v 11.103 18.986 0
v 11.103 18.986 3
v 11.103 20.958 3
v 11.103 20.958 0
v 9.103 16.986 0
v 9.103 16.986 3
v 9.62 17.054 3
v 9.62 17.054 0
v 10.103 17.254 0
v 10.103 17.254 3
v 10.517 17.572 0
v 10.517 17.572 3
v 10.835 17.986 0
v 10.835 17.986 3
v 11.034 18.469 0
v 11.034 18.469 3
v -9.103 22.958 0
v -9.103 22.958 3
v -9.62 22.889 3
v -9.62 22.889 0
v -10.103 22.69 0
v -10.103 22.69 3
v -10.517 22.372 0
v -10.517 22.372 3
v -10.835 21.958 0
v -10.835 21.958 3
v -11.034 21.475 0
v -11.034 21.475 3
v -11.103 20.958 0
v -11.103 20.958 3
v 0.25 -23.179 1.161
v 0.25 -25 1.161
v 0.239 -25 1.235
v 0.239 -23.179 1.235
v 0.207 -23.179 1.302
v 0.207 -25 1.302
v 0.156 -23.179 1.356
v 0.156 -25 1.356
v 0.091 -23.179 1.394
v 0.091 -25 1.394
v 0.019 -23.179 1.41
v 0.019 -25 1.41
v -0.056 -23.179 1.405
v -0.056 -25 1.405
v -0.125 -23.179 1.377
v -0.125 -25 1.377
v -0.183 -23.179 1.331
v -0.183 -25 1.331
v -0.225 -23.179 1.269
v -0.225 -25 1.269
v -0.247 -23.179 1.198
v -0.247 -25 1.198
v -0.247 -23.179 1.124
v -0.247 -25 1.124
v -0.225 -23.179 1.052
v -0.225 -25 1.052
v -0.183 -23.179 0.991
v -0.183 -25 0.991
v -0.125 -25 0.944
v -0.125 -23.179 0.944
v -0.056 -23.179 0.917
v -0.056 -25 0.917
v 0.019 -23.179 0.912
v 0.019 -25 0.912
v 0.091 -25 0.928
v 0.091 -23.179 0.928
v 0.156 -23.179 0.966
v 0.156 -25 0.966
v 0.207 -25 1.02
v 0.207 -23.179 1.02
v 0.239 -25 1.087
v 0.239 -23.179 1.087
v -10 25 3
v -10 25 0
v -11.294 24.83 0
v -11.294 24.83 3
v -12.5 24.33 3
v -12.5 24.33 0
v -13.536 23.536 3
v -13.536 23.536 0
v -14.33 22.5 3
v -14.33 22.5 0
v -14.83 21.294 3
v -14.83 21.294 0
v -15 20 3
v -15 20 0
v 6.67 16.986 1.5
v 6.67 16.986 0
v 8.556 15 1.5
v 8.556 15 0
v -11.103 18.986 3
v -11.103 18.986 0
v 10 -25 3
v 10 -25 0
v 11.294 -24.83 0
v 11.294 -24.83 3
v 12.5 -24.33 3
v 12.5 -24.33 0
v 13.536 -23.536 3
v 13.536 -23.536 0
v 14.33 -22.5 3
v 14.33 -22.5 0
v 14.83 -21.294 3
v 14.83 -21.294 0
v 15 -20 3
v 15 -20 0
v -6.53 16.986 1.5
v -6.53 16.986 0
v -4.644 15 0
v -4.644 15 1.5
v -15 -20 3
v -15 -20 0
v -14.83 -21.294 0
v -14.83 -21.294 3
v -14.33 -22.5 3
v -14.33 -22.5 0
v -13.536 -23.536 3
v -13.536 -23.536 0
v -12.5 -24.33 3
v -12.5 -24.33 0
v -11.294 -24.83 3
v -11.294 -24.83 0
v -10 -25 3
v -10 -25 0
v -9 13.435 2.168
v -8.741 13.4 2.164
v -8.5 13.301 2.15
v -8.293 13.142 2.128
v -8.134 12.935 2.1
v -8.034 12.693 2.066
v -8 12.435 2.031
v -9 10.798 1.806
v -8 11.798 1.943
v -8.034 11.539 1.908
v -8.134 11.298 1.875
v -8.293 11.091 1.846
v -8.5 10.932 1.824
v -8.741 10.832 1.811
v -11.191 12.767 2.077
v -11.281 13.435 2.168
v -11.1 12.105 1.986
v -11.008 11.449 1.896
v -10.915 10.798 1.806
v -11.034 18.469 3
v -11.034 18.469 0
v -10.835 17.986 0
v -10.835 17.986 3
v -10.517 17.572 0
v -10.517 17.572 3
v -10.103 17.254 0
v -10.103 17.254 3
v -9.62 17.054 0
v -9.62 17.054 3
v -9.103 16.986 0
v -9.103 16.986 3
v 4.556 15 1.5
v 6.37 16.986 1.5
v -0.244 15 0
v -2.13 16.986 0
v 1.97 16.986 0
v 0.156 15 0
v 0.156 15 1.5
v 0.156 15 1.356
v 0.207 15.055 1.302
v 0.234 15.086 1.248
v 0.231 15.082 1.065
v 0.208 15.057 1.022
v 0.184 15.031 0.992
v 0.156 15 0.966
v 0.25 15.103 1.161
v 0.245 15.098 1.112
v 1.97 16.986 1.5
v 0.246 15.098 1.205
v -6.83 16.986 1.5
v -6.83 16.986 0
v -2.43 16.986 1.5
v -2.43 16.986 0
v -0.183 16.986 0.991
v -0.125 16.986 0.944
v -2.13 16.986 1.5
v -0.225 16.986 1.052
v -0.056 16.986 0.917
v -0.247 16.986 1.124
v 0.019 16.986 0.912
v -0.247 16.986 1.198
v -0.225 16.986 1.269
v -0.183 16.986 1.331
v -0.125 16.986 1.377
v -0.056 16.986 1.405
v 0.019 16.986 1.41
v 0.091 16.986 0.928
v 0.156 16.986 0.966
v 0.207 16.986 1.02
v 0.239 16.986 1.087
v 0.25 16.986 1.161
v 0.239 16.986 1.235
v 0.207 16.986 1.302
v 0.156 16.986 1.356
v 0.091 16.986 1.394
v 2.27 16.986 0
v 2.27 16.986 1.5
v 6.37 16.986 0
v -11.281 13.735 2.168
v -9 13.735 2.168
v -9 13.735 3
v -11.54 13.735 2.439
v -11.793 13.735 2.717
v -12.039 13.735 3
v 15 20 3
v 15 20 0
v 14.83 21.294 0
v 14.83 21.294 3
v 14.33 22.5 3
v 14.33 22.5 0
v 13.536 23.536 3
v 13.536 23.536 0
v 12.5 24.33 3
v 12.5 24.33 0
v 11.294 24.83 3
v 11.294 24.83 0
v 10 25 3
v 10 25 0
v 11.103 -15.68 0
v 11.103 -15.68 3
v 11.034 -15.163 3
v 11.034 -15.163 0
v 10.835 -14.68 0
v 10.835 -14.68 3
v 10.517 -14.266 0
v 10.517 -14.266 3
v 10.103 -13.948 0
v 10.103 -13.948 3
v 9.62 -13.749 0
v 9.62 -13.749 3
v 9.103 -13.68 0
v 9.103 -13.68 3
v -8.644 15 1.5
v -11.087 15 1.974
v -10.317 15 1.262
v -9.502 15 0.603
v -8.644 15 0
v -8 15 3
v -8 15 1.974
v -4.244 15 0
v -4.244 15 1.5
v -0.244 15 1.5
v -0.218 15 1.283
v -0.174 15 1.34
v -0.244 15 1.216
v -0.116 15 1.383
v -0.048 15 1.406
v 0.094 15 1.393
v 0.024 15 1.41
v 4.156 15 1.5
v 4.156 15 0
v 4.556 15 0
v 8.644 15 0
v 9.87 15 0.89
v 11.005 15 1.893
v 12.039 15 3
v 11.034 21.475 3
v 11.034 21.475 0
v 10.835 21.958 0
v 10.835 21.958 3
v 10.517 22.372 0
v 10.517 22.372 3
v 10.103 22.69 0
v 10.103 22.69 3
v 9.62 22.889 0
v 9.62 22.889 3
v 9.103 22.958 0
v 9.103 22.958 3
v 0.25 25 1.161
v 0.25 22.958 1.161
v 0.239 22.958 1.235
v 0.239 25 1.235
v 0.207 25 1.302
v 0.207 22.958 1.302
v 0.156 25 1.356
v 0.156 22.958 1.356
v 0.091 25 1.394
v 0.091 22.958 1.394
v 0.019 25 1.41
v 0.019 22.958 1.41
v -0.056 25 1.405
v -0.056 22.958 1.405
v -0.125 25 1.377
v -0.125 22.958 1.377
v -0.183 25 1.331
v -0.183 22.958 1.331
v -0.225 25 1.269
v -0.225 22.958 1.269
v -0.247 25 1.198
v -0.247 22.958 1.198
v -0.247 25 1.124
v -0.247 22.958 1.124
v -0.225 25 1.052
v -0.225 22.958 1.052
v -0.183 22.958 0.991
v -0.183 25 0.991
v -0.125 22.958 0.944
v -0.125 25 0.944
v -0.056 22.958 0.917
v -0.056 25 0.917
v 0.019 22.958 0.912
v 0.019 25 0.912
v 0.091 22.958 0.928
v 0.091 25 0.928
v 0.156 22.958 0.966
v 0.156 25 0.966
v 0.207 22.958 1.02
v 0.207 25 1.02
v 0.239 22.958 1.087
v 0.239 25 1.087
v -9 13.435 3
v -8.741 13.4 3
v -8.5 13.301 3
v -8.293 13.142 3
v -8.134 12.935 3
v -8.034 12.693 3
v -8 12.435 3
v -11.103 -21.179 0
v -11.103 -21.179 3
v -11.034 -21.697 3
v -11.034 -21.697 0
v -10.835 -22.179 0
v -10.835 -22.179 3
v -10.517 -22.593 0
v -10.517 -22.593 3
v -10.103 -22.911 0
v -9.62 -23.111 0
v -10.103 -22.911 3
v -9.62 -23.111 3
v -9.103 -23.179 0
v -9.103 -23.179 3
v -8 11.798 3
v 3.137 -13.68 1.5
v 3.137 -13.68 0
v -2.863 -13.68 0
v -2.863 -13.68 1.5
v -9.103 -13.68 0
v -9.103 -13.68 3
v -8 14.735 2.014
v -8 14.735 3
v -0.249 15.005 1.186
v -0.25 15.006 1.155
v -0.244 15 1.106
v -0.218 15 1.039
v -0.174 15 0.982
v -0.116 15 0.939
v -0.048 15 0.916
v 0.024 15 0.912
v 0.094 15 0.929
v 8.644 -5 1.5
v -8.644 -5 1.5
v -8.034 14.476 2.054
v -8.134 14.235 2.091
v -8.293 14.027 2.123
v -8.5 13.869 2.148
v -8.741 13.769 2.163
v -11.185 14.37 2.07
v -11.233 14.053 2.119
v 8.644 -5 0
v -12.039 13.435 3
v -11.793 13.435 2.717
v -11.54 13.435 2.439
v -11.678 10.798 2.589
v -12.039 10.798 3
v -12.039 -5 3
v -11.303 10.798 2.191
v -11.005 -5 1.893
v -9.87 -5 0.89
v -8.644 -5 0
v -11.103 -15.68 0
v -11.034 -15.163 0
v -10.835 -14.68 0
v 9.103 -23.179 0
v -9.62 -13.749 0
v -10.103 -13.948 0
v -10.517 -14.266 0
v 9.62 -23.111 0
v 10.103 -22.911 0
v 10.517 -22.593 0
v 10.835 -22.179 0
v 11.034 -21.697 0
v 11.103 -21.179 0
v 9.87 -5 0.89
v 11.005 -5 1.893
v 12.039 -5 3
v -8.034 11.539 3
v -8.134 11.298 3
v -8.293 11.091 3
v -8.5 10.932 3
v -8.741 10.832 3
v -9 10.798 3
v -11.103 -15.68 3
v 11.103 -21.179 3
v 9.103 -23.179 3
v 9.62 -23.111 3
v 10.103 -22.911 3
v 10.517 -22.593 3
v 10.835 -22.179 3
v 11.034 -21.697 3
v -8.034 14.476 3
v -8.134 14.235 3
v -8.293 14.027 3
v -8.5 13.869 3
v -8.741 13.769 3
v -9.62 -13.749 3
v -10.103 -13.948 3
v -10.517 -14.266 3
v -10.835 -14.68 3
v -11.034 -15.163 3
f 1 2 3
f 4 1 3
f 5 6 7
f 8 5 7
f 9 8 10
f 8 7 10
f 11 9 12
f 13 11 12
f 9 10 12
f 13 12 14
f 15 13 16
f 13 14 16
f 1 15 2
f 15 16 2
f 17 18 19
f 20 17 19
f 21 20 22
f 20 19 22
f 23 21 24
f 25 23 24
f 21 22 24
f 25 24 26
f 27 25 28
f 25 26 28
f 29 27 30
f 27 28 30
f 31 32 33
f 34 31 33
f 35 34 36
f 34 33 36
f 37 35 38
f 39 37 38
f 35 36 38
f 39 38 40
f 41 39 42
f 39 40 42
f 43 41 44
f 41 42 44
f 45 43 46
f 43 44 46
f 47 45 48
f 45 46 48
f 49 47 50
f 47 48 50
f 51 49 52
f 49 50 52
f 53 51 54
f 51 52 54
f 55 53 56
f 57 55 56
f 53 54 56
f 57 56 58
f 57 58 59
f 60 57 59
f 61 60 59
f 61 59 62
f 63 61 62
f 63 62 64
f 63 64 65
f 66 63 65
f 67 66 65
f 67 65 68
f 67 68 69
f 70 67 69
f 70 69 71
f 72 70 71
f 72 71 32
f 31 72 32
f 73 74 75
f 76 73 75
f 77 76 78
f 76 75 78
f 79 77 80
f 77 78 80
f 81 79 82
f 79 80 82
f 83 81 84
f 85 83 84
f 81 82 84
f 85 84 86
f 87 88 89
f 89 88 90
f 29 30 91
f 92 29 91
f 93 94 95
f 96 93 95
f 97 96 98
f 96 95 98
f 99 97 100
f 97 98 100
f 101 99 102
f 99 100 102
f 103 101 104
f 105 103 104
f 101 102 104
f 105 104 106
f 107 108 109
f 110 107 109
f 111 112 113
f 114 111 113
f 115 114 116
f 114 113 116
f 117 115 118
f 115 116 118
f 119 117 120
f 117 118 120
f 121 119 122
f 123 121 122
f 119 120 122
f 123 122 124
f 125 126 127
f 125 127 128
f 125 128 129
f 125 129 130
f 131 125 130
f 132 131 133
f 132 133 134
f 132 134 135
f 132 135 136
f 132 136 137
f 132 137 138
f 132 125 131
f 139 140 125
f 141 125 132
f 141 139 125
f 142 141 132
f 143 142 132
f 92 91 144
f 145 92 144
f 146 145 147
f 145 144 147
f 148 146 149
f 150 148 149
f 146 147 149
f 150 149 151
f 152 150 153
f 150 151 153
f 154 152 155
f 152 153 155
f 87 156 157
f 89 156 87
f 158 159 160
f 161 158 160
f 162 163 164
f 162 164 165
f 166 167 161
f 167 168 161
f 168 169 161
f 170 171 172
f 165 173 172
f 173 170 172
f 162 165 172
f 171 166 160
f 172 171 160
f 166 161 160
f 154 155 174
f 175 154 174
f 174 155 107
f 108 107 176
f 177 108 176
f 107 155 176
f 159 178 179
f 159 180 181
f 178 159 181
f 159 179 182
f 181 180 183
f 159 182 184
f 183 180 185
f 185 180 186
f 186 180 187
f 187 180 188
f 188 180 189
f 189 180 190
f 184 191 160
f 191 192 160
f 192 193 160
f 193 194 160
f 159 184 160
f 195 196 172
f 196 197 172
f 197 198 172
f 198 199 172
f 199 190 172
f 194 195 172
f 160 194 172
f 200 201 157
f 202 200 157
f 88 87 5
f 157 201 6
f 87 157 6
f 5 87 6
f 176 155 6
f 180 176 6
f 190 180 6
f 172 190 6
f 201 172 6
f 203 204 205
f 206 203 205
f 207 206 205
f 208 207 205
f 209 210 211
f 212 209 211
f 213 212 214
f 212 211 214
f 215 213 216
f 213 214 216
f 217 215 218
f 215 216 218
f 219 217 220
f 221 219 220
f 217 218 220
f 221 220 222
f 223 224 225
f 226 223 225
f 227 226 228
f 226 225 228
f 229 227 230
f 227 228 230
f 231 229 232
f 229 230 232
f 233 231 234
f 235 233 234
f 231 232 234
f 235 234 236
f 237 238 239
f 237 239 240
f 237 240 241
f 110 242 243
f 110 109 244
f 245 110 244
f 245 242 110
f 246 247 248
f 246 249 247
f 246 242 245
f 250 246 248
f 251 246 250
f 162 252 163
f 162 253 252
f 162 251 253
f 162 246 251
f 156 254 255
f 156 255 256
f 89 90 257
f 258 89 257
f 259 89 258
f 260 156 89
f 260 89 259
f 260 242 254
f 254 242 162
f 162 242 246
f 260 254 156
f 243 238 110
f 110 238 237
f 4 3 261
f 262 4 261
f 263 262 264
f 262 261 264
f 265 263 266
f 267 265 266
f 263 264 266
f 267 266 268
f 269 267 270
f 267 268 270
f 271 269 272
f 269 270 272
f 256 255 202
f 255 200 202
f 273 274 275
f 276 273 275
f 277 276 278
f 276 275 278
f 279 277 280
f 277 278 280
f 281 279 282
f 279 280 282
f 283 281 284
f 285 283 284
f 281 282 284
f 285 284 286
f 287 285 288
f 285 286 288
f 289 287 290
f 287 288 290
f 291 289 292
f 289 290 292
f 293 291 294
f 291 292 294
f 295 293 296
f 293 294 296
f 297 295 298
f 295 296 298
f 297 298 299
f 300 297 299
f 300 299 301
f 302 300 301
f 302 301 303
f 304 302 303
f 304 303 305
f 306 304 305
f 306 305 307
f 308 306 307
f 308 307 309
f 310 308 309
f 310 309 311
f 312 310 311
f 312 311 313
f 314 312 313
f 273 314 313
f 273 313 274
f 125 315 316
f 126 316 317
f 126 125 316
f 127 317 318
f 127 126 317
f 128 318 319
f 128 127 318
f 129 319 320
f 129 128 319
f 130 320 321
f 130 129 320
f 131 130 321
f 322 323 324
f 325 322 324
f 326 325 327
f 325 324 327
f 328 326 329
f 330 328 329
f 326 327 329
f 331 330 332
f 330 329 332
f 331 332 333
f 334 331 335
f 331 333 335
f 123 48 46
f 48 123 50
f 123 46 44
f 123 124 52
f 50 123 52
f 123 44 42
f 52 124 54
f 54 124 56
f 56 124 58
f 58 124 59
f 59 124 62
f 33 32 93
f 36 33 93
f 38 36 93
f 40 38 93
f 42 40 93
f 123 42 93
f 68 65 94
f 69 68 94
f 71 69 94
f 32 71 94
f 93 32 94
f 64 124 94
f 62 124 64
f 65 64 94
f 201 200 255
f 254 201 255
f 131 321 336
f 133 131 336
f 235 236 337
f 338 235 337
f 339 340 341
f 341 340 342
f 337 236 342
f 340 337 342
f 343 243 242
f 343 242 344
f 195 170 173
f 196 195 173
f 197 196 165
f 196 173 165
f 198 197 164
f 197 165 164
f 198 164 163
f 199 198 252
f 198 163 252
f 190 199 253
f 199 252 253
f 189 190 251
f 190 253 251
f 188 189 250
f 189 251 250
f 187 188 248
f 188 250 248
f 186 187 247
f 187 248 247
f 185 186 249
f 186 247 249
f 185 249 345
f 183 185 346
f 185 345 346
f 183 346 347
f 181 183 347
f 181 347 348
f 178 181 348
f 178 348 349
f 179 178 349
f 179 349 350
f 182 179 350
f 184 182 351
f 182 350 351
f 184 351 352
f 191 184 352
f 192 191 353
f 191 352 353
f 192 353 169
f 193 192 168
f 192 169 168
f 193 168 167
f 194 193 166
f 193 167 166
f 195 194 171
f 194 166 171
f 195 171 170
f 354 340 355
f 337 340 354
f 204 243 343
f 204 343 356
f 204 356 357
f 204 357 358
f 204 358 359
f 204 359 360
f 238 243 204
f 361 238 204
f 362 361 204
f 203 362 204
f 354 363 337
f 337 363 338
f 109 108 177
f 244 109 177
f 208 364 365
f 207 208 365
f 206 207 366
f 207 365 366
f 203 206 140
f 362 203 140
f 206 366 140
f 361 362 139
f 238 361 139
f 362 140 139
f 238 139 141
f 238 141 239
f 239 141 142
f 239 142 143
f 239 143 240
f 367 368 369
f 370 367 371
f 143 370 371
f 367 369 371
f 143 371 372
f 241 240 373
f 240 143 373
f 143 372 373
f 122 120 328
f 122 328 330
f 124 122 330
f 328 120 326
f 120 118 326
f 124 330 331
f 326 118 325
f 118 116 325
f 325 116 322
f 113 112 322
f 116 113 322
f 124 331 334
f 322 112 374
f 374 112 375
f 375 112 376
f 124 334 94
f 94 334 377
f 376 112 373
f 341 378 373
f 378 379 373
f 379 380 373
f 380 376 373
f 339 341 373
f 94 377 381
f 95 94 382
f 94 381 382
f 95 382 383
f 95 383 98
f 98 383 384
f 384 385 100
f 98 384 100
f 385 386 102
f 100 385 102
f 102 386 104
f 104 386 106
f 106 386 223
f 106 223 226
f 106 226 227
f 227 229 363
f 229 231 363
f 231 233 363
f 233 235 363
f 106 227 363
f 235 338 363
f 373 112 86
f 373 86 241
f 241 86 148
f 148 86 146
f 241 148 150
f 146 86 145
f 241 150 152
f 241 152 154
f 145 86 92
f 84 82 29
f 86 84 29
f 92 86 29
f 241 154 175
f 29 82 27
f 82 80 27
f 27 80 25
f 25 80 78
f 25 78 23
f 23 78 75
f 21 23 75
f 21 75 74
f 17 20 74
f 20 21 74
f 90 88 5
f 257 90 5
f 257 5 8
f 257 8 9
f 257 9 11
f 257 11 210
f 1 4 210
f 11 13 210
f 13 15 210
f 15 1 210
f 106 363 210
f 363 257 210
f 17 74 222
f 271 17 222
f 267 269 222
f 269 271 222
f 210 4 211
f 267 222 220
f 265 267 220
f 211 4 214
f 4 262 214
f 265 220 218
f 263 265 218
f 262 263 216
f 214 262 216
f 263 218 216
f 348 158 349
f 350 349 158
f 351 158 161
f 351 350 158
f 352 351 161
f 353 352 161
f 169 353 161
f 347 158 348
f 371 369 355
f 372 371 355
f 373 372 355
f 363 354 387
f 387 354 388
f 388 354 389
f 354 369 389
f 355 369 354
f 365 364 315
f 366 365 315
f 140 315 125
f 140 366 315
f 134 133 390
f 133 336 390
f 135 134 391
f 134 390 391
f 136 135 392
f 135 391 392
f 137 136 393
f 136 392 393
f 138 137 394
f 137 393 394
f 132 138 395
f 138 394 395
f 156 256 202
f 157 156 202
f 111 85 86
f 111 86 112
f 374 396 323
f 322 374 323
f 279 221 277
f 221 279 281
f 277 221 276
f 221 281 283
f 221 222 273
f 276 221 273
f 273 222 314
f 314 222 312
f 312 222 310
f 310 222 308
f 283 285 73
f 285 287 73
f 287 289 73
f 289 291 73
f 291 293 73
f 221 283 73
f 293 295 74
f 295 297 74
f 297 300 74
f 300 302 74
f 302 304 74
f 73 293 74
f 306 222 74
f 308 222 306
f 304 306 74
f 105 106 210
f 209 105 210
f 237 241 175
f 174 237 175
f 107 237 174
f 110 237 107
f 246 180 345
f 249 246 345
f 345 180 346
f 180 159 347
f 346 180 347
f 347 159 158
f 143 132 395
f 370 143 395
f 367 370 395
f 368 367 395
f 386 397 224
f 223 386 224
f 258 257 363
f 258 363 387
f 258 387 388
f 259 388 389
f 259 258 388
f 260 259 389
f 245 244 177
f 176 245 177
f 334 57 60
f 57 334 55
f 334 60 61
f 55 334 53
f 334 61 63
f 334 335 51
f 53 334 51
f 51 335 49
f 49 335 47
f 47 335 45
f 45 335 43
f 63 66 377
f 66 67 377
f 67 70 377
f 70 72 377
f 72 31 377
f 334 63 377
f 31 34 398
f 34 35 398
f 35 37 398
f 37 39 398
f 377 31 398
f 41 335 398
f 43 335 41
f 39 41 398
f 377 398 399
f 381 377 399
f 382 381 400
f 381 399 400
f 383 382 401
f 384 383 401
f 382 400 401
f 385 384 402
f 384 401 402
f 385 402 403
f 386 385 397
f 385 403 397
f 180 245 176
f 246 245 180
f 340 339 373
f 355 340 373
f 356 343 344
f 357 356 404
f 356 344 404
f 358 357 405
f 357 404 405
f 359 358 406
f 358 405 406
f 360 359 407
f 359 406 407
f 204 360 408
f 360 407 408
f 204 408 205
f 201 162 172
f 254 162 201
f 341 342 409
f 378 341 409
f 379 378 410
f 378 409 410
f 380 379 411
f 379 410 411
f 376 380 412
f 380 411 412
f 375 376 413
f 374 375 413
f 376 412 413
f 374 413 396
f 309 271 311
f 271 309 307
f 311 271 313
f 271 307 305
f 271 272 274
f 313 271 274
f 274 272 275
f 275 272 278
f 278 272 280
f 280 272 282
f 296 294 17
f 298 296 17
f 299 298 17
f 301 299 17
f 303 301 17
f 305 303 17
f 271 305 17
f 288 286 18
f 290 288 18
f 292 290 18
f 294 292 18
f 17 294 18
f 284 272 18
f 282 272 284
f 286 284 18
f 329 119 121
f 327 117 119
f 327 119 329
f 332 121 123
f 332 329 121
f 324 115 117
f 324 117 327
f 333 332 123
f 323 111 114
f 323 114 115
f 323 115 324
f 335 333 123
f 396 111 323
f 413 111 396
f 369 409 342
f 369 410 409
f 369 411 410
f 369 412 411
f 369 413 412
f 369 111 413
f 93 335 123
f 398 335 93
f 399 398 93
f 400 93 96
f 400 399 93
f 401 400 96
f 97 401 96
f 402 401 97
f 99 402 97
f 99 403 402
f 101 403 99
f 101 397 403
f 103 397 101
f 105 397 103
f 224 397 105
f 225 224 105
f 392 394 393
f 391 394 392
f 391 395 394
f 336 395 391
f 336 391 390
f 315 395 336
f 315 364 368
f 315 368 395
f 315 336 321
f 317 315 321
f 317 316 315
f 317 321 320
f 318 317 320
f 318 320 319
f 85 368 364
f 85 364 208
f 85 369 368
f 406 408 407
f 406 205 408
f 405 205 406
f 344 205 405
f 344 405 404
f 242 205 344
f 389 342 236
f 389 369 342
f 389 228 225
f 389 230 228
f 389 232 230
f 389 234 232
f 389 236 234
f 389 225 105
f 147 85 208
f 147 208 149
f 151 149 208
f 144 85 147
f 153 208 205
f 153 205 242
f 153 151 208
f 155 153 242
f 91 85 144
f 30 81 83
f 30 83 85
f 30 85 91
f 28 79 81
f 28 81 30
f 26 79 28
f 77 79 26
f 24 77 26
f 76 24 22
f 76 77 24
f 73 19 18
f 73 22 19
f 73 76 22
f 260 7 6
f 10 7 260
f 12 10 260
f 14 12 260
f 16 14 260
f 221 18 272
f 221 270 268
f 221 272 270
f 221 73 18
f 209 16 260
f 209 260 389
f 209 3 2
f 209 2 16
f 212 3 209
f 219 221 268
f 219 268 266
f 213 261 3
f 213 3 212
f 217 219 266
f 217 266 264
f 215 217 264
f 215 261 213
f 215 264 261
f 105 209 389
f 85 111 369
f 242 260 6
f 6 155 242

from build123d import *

# Parameters (mm, degrees)
F1_DEPTH      = 3
F2_R          = 15.7802685444
F3_DEPTH      = 15
F3_DEPTH_BACK = 5
F5_DEPTH      = 25
F7_DEPTH      = 1.5
F9_DEPTH      = 7
F10_R         = 1
F11_R         = 0.25
F12_DEPTH     = 60


with BuildPart() as f1:
    # F0 (on Top) → F1 (new body)
    with BuildSketch(Plane.XY):
        with BuildLine():
            Line((-10, -25), (10, -25))
            ThreePointArc((10, -25), (13.5355339059, -23.5355339059), (15, -20))
            Line((15, -20), (15, 20))
            ThreePointArc((15, 20), (13.5355339059, 23.5355339059), (10, 25))
            Line((10, 25), (-10, 25))
            ThreePointArc((-10, 25), (-13.5355339059, 23.5355339059), (-15, 20))
            Line((-15, 20), (-15, -20))
            ThreePointArc((-15, -20), (-13.5355339059, -23.5355339059), (-10, -25))
        make_face()
    extrude(amount=F1_DEPTH)

    # F2 (on Front) → F3 (cut, two sides)
    with BuildSketch(Plane.XZ) as f3_sk:
        with Locations((0, 13.2022947073)):
            Circle(F2_R)
    extrude(amount=-F3_DEPTH, mode=Mode.SUBTRACT)
    extrude(f3_sk.sketch, amount=F3_DEPTH_BACK, mode=Mode.SUBTRACT)

    # F4 (on face) → F5 (cut)
    with BuildSketch(Plane.XY.offset(3)):
        with BuildLine():
            ThreePointArc((11.1025739461, -15.6803686619), (10.5167875085, -14.2661550995), (9.1025739461, -13.6803686619))
            Line((9.1025739461, -13.6803686619), (-9.1025739461, -13.6803686619))
            ThreePointArc((-9.1025739461, -13.6803686619), (-10.5167875085, -14.2661550995), (-11.1025739461, -15.6803686619))
            Line((-11.1025739461, -15.6803686619), (-11.1025739461, -21.1788791716))
            ThreePointArc((-11.1025739461, -21.1788791716), (-10.5167875085, -22.593092734), (-9.1025739461, -23.1788791716))
            Line((-9.1025739461, -23.1788791716), (9.1025739461, -23.1788791716))
            ThreePointArc((9.1025739461, -23.1788791716), (10.5167875085, -22.593092734), (11.1025739461, -21.1788791716))
            Line((11.1025739461, -21.1788791716), (11.1025739461, -15.6803686619))
        make_face()
        with BuildLine():
            ThreePointArc((11.1025739461, 20.9576397687), (10.5167875085, 22.3718533311), (9.1025739461, 22.9576397687))
            Line((9.1025739461, 22.9576397687), (-9.1025739461, 22.9576397687))
            ThreePointArc((-9.1025739461, 22.9576397687), (-10.5167875085, 22.3718533311), (-11.1025739461, 20.9576397687))
            Line((-11.1025739461, 20.9576397687), (-11.1025739461, 18.9862303883))
            ThreePointArc((-11.1025739461, 18.9862303883), (-10.5167875085, 17.5720168259), (-9.1025739461, 16.9862303883))
            Line((-9.1025739461, 16.9862303883), (9.1025739461, 16.9862303883))
            ThreePointArc((9.1025739461, 16.9862303883), (10.5167875085, 17.5720168259), (11.1025739461, 18.9862303883))
            Line((11.1025739461, 18.9862303883), (11.1025739461, 20.9576397687))
        make_face()
    extrude(amount=-F5_DEPTH, mode=Mode.SUBTRACT)

    # F6 (on face) → F7 (cut)
    with BuildSketch(Plane(origin=(0, 0, 0), x_dir=(1, 0, 0), z_dir=(0, 0, -1))):
        Polygon((8.6438585016, 5), (3.1369663253, 13.6803686619), (-2.8630336747, 13.6803686619), (-8.6438585016, 5), align=None)
        Polygon((-6.5296259269, -16.9862303883), (-4.6438585016, -15), (-8.6438585016, -15), (-6.8296259269, -16.9862303883), align=None)
        Polygon((-0.2438585016, -15), (-4.2438585016, -15), (-2.4296259269, -16.9862303883), (-2.1296259269, -16.9862303883), align=None)
        Polygon((4.1561414984, -15), (0.1561414984, -15), (1.9703740731, -16.9862303883), (2.2703740731, -16.9862303883), align=None)
        Polygon((8.5561414984, -15), (4.5561414984, -15), (6.3703740731, -16.9862303883), (6.6703740731, -16.9862303883), align=None)
    extrude(amount=-F7_DEPTH, mode=Mode.SUBTRACT)

    # F8 (on face) → F9 (join)
    with BuildSketch(Plane(origin=(-15, 0, 0), x_dir=(0, -1, 0), z_dir=(-1, 0, 0))):
        Polygon((-13.7345343828, 3), (-16.5546499193, 3), (-16.3944102824, 1.7589493655), (-13.7345343828, 2.1682542283), align=None)
        Polygon((-10.7979638994, 3), (-13.4345343828, 3), (-13.4345343828, 2.1682542283), (-10.7979638994, 1.8060837174), align=None)
    extrude(amount=-F9_DEPTH)

    # F10
    f10_edges = [f1.edges().sort_by_distance(p)[0] for p in [
        (-8, 10.797964, 2.403042),
        (-8, 13.434534, 2.584127),
        (-8, 13.734534, 2.584127),
    ]]
    fillet(f10_edges, radius=F10_R)

    # F11 (on face) → F12 (cut)
    with BuildSketch(Plane.XZ.offset(25)):
        with Locations((0, 1.1609706562)):
            Circle(F11_R)
    extrude(amount=-F12_DEPTH, mode=Mode.SUBTRACT)


solid = f1.part
